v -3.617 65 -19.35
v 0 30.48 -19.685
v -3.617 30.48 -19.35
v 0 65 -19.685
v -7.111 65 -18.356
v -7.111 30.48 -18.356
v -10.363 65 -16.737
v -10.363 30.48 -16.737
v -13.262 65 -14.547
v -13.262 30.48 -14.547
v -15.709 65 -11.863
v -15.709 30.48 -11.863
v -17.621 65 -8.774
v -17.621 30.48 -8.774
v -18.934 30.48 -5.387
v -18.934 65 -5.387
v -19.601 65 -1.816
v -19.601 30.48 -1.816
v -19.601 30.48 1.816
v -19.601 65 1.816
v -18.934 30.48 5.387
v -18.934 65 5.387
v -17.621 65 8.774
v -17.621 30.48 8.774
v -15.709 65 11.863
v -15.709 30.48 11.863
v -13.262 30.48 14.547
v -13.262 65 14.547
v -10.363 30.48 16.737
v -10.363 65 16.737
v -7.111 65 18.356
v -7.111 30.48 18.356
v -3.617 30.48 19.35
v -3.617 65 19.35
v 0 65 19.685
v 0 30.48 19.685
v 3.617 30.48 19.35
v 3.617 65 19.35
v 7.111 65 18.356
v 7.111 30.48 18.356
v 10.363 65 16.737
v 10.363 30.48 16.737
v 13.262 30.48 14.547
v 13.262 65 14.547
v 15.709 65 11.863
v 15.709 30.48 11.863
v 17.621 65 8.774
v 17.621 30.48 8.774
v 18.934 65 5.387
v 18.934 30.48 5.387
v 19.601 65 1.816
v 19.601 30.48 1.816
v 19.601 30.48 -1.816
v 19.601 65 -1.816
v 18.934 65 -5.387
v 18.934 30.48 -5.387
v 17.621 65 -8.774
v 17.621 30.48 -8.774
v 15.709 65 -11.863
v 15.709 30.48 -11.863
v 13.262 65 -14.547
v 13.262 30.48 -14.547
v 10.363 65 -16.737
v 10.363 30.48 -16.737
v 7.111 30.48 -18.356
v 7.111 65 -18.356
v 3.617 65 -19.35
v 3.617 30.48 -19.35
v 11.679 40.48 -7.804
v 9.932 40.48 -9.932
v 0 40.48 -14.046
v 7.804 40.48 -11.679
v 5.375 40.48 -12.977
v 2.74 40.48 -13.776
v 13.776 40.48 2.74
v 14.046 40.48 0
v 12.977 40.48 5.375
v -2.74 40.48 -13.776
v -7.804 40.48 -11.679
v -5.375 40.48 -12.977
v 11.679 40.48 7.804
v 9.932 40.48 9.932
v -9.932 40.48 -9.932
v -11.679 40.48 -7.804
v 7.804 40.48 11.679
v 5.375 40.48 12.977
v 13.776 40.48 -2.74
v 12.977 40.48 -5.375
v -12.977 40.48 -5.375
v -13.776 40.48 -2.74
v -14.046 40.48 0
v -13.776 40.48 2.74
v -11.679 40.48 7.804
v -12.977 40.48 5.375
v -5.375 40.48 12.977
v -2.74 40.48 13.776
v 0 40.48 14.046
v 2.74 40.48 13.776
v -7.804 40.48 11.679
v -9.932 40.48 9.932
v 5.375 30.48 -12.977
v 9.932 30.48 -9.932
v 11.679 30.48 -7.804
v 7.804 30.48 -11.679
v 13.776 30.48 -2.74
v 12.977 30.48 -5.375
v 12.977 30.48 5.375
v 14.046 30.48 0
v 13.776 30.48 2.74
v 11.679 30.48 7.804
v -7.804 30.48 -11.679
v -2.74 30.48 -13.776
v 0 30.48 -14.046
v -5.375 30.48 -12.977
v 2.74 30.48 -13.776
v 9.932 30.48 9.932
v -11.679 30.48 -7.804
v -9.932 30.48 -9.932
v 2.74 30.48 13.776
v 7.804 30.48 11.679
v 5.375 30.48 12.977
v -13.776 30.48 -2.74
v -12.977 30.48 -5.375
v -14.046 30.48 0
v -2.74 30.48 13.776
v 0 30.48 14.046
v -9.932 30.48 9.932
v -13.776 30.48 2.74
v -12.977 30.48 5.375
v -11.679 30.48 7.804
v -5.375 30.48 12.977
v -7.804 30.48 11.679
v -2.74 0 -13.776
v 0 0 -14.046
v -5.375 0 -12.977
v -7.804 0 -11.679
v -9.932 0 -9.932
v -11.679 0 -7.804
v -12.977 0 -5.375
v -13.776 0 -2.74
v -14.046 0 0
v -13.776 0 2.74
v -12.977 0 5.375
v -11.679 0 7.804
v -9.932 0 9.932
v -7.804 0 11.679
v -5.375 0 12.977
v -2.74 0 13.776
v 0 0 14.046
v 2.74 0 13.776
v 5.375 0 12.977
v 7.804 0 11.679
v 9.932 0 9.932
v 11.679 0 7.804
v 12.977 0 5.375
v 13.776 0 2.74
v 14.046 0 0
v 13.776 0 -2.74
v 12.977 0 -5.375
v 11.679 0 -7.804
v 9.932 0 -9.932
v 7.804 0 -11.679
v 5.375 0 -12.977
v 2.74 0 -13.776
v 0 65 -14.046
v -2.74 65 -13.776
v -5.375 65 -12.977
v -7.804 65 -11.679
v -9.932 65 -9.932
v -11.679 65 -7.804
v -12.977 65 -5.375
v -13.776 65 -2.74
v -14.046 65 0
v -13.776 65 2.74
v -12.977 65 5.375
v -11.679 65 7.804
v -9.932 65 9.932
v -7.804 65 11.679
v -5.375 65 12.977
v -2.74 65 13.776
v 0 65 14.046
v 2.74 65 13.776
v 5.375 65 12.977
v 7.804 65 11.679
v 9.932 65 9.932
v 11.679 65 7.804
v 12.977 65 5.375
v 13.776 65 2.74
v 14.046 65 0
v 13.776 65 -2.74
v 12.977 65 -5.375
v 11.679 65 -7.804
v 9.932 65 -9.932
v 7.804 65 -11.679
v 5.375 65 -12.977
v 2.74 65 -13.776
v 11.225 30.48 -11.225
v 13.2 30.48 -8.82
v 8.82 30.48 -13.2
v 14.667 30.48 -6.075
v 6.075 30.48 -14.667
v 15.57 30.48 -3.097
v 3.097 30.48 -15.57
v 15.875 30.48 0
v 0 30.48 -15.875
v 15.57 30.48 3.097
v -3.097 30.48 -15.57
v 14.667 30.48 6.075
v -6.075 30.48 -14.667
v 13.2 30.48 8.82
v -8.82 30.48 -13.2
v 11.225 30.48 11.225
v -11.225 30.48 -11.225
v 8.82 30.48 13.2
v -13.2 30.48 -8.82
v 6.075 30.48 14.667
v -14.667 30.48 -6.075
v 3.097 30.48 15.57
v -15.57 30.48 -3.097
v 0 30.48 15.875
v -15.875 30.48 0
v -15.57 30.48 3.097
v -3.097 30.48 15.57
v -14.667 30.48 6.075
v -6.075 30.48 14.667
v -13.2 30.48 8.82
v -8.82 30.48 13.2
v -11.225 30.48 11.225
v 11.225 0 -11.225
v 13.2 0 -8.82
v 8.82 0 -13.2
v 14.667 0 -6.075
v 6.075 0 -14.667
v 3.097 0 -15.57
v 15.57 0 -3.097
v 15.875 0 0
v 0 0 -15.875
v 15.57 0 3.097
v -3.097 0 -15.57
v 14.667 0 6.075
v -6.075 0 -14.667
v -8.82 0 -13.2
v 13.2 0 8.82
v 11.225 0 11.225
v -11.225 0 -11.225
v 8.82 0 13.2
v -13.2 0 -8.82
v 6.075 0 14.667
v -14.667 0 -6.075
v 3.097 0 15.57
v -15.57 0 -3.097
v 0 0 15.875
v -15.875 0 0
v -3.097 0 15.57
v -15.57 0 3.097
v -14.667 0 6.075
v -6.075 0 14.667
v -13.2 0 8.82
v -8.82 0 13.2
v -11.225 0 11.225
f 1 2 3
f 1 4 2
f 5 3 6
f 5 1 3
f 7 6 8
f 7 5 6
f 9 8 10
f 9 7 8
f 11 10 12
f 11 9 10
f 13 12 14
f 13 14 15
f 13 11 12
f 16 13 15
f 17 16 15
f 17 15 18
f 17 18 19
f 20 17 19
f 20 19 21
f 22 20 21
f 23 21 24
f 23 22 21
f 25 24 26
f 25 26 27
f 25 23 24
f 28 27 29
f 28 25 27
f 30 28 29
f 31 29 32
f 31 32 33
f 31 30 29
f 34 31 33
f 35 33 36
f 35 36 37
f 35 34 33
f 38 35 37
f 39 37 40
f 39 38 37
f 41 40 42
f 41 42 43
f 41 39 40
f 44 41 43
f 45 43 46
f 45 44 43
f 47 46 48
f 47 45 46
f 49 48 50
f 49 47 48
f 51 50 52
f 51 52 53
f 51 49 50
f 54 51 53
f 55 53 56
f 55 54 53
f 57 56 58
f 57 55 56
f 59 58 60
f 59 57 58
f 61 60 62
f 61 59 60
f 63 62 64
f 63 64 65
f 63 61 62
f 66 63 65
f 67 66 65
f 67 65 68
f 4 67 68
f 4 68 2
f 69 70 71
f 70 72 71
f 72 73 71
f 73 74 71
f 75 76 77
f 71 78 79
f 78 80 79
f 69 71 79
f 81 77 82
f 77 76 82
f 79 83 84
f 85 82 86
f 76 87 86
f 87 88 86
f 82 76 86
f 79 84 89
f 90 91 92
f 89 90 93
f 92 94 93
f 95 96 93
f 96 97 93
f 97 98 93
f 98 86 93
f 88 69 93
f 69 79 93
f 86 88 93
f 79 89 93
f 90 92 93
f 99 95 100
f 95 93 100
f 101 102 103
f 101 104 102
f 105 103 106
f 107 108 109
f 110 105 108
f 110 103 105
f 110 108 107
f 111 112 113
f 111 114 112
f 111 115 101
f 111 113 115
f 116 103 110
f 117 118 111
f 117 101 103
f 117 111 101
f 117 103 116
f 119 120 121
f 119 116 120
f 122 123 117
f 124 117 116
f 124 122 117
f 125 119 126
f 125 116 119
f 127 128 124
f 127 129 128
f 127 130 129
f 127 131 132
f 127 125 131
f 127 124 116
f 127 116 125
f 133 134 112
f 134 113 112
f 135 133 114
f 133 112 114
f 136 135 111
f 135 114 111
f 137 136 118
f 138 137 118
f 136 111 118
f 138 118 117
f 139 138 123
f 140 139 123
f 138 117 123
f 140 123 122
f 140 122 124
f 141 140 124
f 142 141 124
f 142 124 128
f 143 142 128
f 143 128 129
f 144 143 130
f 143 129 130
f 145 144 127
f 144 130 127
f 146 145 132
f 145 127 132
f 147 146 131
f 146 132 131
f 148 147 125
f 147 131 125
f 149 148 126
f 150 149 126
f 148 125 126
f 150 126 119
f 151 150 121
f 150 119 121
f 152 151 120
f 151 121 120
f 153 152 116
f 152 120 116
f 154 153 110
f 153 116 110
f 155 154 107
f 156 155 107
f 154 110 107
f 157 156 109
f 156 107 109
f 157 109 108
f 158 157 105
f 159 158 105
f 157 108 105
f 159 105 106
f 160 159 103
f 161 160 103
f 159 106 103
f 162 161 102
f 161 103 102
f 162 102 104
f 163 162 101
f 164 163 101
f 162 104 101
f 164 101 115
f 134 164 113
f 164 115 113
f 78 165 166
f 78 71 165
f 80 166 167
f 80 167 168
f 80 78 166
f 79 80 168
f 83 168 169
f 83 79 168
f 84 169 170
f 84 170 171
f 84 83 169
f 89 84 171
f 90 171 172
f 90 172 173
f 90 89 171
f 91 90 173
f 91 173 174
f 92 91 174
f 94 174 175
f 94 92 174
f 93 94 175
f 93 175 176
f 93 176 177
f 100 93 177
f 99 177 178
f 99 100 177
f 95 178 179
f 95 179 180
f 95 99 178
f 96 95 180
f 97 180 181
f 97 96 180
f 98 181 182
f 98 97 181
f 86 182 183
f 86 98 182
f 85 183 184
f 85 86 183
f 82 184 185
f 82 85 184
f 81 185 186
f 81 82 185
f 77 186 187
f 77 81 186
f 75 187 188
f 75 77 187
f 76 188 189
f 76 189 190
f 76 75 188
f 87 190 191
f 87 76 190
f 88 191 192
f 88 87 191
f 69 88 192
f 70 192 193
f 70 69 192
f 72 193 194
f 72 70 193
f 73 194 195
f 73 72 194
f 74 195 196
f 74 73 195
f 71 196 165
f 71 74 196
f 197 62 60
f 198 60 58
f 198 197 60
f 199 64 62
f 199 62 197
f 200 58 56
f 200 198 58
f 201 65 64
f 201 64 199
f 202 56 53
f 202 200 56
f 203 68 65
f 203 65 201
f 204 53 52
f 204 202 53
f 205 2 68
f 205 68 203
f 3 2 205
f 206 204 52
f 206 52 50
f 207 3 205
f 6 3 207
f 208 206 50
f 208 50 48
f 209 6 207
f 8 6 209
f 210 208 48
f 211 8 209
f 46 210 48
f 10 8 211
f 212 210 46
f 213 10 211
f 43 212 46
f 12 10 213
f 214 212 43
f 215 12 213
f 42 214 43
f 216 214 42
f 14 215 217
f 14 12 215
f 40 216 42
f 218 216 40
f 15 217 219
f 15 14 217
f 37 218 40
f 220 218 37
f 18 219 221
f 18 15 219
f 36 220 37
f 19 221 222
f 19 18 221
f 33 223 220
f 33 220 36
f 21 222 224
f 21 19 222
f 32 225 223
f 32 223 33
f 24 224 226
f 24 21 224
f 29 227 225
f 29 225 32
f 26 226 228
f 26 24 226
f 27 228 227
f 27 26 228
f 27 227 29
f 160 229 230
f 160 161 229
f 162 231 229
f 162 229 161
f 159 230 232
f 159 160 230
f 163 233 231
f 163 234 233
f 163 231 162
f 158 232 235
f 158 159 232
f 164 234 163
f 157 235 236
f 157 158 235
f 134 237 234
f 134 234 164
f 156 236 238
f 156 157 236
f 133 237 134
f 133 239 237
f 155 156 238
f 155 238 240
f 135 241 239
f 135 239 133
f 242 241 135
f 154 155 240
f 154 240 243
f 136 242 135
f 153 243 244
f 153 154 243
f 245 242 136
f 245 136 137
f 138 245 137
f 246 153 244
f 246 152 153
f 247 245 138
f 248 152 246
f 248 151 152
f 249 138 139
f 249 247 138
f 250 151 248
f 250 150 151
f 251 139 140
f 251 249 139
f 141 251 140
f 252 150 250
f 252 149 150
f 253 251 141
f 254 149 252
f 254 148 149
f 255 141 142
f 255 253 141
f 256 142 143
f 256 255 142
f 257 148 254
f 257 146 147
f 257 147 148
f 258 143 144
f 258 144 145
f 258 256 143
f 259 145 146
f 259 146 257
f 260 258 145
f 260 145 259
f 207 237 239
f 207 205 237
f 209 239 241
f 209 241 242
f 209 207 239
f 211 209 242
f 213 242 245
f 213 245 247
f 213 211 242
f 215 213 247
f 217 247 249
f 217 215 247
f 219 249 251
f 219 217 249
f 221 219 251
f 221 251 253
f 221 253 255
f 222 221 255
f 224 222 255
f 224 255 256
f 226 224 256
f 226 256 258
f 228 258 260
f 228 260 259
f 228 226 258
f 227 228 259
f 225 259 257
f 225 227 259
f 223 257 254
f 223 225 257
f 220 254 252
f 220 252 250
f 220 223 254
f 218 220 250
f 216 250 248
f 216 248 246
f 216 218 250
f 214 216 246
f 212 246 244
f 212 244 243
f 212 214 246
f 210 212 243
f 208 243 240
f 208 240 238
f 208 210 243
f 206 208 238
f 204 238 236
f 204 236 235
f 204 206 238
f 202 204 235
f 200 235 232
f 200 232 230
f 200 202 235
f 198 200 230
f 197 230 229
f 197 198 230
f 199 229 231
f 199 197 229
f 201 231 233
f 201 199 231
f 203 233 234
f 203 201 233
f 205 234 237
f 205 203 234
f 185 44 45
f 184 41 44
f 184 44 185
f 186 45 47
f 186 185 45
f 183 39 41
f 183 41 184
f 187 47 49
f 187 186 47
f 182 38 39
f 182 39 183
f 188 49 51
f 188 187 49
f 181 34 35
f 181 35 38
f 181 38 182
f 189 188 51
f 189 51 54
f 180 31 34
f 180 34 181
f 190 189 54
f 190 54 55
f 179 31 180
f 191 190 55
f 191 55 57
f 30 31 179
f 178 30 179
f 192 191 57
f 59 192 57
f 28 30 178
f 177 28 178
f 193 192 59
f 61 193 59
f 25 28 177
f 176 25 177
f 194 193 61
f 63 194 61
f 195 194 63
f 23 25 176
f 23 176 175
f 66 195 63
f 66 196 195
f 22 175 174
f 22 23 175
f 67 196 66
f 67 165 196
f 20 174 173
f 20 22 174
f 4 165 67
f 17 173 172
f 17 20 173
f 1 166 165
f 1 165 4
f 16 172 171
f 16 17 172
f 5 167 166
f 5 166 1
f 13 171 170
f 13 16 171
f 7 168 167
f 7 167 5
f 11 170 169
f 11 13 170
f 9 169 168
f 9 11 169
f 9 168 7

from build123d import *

# Parameters (mm, degrees)
SKETCH1_W   = 14.0462
SKETCH1_H   = 10
SKETCH1_W_2 = 1.8288
SKETCH1_H_2 = 30.48


with BuildPart() as part:
    # Sketch1 → Revolve1 (revolve)
    with BuildSketch(Plane.XY, mode=Mode.PRIVATE) as revolve1_sk:
        with Locations((7.0231, 35.48)):
            Rectangle(SKETCH1_W, SKETCH1_H)
        Polygon((14.0462, 40.48), (14.0462, 30.48), (15.875, 30.48), (19.685, 30.48), (19.685, 65), (14.0462, 65), align=None)
        with Locations((14.9606, 15.24)):
            Rectangle(SKETCH1_W_2, SKETCH1_H_2)
    revolve(revolve1_sk.sketch.rotate(Axis((0, 0, 0), (0, 1, 0)), 90), axis=Axis((0, 0, 0), (0, 1, 0)))


solid = part.part
